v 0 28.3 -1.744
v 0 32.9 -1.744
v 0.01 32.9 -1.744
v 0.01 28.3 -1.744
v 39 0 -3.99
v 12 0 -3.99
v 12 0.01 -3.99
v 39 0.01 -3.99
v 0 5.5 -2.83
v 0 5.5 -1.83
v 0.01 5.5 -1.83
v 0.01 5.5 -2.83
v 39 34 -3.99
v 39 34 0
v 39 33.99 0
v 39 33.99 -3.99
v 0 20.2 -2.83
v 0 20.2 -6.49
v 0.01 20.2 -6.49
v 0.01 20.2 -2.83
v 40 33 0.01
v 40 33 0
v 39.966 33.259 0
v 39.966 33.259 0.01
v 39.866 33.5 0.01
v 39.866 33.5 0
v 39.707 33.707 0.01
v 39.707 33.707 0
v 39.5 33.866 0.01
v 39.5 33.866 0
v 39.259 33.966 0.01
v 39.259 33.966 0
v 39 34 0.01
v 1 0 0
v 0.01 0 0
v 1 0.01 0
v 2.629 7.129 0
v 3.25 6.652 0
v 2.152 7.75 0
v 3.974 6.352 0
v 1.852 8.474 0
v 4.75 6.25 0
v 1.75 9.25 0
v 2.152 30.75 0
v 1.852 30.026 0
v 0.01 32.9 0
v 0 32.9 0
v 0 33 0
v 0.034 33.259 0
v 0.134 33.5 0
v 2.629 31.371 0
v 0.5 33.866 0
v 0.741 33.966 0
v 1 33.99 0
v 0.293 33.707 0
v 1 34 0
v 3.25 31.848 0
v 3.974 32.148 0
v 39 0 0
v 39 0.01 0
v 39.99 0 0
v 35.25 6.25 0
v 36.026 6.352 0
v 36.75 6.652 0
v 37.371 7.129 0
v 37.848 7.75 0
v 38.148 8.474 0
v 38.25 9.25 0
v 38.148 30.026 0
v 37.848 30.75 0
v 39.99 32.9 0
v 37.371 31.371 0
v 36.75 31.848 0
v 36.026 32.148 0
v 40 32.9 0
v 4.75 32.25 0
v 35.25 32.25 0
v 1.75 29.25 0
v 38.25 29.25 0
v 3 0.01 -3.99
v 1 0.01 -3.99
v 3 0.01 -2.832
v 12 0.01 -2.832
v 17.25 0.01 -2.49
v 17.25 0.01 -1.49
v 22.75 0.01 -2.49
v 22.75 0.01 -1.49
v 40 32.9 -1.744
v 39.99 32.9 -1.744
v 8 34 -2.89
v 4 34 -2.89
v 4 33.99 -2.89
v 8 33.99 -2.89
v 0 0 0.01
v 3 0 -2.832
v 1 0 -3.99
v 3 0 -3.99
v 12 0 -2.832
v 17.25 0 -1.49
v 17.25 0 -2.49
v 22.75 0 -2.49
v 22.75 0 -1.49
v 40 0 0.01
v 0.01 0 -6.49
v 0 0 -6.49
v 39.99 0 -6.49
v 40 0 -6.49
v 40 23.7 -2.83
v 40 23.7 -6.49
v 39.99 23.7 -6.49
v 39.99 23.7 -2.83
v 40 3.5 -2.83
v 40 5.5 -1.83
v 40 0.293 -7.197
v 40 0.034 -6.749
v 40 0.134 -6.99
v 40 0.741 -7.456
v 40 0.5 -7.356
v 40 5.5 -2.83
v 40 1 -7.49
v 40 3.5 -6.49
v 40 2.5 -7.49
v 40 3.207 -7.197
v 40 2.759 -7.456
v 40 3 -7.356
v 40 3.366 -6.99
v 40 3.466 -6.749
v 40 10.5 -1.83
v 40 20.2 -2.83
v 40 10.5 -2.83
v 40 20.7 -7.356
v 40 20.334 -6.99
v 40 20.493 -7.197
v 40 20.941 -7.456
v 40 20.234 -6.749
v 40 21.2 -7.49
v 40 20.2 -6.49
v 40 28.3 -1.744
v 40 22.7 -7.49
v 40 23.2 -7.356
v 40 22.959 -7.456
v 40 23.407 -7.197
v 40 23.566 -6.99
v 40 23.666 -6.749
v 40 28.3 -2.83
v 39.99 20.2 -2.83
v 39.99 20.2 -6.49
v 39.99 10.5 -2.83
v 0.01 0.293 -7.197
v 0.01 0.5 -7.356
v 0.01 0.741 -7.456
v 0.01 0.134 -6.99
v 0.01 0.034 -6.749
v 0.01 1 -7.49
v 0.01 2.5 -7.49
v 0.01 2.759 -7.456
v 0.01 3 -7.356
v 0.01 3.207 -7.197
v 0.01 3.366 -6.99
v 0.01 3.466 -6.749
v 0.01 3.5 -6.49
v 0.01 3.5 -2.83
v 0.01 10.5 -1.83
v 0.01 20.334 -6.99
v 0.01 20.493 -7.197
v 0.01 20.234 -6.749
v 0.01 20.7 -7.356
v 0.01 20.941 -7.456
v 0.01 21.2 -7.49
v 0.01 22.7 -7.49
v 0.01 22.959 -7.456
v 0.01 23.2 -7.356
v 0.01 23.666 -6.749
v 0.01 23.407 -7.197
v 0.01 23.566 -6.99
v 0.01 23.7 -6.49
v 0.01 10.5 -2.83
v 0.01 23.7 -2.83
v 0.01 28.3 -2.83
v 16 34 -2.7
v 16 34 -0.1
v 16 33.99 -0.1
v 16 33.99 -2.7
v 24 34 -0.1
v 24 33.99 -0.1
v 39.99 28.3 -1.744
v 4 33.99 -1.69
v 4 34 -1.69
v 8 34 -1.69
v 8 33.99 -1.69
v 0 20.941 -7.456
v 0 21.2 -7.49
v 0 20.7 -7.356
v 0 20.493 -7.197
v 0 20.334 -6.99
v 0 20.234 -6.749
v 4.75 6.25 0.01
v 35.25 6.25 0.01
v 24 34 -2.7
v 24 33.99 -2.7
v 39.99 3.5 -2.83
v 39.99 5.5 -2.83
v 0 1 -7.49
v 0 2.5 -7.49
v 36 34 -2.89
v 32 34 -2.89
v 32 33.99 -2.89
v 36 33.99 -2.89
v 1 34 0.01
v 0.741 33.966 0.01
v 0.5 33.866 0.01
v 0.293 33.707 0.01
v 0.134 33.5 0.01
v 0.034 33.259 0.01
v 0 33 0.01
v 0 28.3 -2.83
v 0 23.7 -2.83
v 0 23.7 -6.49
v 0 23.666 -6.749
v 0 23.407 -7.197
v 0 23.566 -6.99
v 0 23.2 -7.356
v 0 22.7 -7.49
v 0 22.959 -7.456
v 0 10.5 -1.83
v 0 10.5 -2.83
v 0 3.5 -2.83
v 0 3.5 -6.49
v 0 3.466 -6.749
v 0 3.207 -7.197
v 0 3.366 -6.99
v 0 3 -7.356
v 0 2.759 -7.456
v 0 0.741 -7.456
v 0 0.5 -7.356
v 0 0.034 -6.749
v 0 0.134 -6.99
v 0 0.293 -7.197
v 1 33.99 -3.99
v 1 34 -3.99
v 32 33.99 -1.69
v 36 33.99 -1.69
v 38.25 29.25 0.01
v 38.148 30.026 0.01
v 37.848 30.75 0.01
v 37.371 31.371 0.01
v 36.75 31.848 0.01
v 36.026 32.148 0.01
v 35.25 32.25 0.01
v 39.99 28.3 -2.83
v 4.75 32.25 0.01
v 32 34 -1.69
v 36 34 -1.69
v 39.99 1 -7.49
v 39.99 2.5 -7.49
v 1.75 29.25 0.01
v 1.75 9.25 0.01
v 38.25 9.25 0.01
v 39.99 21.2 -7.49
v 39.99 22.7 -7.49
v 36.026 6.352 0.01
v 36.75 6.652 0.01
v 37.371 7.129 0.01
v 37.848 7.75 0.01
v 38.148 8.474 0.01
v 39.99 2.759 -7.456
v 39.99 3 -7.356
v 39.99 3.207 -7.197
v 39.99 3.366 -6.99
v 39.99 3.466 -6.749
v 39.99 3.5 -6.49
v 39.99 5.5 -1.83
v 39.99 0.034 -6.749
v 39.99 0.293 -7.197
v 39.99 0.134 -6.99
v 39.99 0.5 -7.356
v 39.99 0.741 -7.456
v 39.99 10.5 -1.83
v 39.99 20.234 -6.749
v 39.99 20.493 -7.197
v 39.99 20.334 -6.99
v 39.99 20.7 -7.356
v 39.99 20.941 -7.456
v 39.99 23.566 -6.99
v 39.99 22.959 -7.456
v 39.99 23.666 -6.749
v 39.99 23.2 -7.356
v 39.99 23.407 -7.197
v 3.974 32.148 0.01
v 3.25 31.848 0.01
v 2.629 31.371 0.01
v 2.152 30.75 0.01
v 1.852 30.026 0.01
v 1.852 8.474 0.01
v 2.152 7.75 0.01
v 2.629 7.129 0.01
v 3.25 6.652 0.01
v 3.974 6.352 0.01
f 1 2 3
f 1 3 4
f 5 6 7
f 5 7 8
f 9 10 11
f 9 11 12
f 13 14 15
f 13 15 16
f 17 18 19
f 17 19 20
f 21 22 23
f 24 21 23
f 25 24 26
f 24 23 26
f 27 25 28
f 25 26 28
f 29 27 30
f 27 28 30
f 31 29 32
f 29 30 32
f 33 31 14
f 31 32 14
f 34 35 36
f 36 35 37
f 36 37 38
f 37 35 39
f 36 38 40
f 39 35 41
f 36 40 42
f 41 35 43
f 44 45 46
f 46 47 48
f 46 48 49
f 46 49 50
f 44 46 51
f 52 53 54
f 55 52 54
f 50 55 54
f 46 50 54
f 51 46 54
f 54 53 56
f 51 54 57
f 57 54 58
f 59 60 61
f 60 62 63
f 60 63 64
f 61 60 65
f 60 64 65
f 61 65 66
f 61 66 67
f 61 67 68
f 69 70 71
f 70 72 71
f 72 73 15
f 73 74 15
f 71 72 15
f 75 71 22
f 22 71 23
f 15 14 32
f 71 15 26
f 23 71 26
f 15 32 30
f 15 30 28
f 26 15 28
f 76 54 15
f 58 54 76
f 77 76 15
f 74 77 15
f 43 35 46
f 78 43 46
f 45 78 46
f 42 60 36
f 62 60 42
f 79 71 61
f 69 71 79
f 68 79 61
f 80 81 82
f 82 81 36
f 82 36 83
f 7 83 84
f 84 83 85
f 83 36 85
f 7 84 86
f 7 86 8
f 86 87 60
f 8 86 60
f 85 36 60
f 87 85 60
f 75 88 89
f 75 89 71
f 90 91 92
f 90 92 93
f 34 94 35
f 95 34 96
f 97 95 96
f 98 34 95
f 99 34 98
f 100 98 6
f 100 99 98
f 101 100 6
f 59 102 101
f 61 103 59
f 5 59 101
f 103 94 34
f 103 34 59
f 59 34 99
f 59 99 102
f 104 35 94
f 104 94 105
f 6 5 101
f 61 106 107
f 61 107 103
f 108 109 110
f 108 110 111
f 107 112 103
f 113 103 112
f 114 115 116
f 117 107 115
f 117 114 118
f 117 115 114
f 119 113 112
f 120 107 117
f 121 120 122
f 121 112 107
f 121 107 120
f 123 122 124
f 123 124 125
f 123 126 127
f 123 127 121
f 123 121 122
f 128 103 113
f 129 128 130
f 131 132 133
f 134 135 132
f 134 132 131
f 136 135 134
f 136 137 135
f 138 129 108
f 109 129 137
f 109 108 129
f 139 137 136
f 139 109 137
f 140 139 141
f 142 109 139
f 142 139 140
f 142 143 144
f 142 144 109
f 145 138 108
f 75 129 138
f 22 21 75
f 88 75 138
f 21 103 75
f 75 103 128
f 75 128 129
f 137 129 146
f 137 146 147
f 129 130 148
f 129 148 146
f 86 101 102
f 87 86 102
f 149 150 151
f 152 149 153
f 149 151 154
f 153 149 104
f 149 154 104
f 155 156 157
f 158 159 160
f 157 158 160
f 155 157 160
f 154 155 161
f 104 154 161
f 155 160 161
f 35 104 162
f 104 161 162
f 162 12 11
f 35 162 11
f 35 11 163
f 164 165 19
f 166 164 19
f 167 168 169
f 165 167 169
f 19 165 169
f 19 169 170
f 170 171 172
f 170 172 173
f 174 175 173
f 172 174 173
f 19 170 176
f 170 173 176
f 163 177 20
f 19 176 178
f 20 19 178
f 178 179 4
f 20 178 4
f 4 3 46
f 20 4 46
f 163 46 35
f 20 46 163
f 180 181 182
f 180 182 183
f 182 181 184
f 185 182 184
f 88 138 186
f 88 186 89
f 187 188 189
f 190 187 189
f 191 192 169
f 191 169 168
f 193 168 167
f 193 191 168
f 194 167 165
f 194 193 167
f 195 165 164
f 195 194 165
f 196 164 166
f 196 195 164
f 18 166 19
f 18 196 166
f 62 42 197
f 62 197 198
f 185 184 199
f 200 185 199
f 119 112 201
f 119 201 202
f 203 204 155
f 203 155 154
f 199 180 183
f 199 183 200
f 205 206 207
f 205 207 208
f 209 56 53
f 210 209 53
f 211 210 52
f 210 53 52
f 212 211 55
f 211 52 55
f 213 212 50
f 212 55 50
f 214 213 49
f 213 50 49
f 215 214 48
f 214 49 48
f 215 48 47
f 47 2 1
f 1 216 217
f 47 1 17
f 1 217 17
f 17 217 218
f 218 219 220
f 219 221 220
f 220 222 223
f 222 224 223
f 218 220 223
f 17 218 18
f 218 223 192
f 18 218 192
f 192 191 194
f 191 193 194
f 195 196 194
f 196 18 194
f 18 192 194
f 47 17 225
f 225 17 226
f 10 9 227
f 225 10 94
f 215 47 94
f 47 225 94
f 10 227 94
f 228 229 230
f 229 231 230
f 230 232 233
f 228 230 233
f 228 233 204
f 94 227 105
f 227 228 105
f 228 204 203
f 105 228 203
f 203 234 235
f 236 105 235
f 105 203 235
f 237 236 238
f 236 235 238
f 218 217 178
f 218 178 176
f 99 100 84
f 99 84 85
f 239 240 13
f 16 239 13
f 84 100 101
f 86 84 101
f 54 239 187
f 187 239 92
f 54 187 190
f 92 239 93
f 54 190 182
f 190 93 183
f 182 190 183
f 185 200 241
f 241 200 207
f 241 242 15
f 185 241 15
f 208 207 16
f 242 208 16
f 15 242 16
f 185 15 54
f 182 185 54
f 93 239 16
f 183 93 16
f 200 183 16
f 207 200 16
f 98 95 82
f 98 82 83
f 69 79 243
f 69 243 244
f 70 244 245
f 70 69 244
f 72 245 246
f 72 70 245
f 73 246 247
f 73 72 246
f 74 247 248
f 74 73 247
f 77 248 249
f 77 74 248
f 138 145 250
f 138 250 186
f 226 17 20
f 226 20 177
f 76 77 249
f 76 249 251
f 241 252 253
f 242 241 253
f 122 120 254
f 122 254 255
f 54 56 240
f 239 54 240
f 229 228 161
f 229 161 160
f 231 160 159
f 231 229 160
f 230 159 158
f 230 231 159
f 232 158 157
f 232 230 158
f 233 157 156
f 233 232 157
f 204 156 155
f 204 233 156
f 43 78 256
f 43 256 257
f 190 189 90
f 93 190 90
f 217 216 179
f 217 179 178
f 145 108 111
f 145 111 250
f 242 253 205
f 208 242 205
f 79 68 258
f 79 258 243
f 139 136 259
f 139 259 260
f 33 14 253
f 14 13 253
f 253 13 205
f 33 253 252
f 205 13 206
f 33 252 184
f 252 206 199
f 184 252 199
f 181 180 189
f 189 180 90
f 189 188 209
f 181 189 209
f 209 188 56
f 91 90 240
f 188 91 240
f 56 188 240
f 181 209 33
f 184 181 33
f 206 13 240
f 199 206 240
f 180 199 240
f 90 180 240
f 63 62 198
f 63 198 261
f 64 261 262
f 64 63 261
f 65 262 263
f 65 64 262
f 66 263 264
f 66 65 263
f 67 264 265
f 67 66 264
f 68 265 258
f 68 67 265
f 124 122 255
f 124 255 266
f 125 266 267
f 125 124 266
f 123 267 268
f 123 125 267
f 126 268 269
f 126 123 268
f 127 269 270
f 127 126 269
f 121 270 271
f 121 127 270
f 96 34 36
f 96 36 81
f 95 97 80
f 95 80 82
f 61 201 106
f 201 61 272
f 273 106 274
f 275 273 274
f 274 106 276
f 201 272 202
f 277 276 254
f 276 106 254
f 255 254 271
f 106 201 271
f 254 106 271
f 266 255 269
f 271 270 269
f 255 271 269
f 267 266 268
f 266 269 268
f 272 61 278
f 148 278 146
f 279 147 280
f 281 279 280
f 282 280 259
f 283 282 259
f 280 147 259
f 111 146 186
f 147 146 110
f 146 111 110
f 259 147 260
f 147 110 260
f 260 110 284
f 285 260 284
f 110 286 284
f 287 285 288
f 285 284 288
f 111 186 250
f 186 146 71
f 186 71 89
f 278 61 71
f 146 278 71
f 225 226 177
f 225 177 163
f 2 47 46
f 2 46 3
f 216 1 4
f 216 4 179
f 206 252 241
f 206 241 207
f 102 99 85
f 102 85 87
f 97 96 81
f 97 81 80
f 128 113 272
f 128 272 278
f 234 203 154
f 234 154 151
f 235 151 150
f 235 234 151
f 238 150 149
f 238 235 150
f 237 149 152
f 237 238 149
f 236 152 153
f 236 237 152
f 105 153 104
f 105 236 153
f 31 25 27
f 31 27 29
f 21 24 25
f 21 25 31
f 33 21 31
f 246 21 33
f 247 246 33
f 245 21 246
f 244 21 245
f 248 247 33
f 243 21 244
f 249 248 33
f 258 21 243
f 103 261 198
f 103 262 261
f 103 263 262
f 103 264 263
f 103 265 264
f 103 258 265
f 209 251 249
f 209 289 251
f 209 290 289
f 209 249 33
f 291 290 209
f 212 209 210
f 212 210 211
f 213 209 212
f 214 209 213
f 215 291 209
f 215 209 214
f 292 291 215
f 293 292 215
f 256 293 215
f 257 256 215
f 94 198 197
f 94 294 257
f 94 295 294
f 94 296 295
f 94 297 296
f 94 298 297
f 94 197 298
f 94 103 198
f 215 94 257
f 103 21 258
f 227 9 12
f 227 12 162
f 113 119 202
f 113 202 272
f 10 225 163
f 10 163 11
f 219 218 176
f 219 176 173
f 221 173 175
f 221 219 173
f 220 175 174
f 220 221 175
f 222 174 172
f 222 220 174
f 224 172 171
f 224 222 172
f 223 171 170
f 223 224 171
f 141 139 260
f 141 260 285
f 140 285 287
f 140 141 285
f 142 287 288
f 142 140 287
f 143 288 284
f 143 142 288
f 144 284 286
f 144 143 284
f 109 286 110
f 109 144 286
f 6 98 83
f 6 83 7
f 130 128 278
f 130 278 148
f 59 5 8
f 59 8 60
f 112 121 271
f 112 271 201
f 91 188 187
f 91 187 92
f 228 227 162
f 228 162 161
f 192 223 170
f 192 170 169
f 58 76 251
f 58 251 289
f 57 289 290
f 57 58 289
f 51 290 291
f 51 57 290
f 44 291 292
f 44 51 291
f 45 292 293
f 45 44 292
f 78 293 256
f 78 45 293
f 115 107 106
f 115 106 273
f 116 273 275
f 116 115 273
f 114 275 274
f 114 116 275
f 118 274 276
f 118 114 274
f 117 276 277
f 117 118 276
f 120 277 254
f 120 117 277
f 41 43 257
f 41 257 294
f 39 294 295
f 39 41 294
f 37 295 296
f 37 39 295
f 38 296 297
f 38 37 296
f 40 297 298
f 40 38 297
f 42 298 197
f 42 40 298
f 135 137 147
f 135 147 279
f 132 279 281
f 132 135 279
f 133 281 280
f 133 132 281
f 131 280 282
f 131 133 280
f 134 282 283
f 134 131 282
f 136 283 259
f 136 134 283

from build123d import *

# Parameters (mm, degrees)
RESSALTO_EXTRUS_O1_DEPTH = 0.01
ESBO_O2_W                = 5.5
ESBO_O2_H                = 1
RESSALTO_EXTRUS_O2_DEPTH = 0.01
RESSALTO_EXTRUS_O3_DEPTH = 0.01
RESSALTO_EXTRUS_O6_DEPTH = 0.01
ESBO_O5_W                = 38
ESBO_O5_H                = 4
ESBO_O5_W_2              = 8
ESBO_O5_H_2              = 2.6
ESBO_O5_W_3              = 4
ESBO_O5_H_3              = 1.2
RESSALTO_EXTRUS_O8_DEPTH = 0.01


with BuildPart() as part:
    # Esboço1 → Ressalto-extrusão1 (new body)
    with BuildSketch(Plane.XY):
        with BuildLine():
            Line((0, 0), (40, 0))
            Line((40, 0), (40, 33))
            ThreePointArc((40, 33), (39.707106781, 33.707106781), (39, 34))
            Line((39, 34), (1, 34))
            ThreePointArc((1, 34), (0.292893219, 33.707106781), (0, 33))
            Line((0, 33), (0, 0))
        make_face()
        with BuildLine():
            Line((4.75, 6.25), (35.25, 6.25))
            ThreePointArc((35.25, 6.25), (37.371320344, 7.128679656), (38.25, 9.25))
            Line((38.25, 9.25), (38.25, 29.25))
            ThreePointArc((38.25, 29.25), (37.371320344, 31.371320344), (35.25, 32.25))
            Line((35.25, 32.25), (4.75, 32.25))
            ThreePointArc((4.75, 32.25), (2.628679656, 31.371320344), (1.75, 29.25))
            Line((1.75, 29.25), (1.75, 9.25))
            ThreePointArc((1.75, 9.25), (2.628679656, 7.128679656), (4.75, 6.25))
        make_face(mode=Mode.SUBTRACT)
    extrude(amount=RESSALTO_EXTRUS_O1_DEPTH)

    # Esboço2 → Ressalto-extrusão2 (add)
    with BuildSketch(Plane.XZ):
        Polygon((1, -3.99), (3, -3.99), (3, -2.832105263), (12, -2.832105263), (12, -3.99), (39, -3.99), (39, 0.01), (1, 0.01), align=None)
        with Locations((20, -1.99)):
            Rectangle(ESBO_O2_W, ESBO_O2_H, mode=Mode.SUBTRACT)
    extrude(amount=-RESSALTO_EXTRUS_O2_DEPTH)

    # Esboço3 → Ressalto-extrusão3 (add)
    with BuildSketch(Plane(origin=(40, 0, 0), x_dir=(0, 0, -1), z_dir=(1, 0, 0))):
        with BuildLine():
            Line((4.5527289, 3.5), (2.83, 3.5))
            Line((2.83, 3.5), (2.83, 5.5))
            Line((2.83, 5.5), (1.83, 5.5))
            Line((1.83, 5.5), (1.83, 10.5))
            Line((1.83, 10.5), (2.83, 10.5))
            Line((2.83, 10.5), (2.83, 20.2))
            Line((2.83, 20.2), (6.49, 20.2))
            ThreePointArc((6.49, 20.2), (7.197106781, 20.492893219), (7.49, 21.2))
            Line((7.49, 21.2), (7.49, 22.7))
            ThreePointArc((7.49, 22.7), (7.197106781, 23.407106781), (6.49, 23.7))
            Line((6.49, 23.7), (2.83, 23.7))
            Line((2.83, 23.7), (2.83, 28.3))
            Line((2.83, 28.3), (1.743518889, 28.3))
            Line((1.743518889, 28.3), (1.743518889, 32.9))
            Line((1.743518889, 32.9), (-0.01, 32.9))
            Line((-0.01, 32.9), (-0.01, 0))
            Line((-0.01, 0), (3.99, 0))
            Line((3.99, 0), (6.49, 0))
            ThreePointArc((6.49, 0), (7.197106781, 0.292893219), (7.49, 1))
            Line((7.49, 1), (7.49, 2.5))
            ThreePointArc((7.49, 2.5), (7.197106781, 3.207106781), (6.49, 3.5))
            Line((6.49, 3.5), (4.5527289, 3.5))
        make_face()
    extrude(amount=-RESSALTO_EXTRUS_O3_DEPTH)

    # Esboço5 → Ressalto-extrusão8 (add)
    with BuildSketch(Plane(origin=(0, 34, 0), x_dir=(1, 0, 0), z_dir=(0, 1, 0))):
        with Locations((20, 1.99)):
            Rectangle(ESBO_O5_W, ESBO_O5_H)
        with Locations((20, 1.4)):
            Rectangle(ESBO_O5_W_2, ESBO_O5_H_2, mode=Mode.SUBTRACT)
        with Locations((34, 2.29)):
            Rectangle(ESBO_O5_W_3, ESBO_O5_H_3, mode=Mode.SUBTRACT)
        with Locations((6, 2.29)):
            Rectangle(ESBO_O5_W_3, ESBO_O5_H_3, mode=Mode.SUBTRACT)
    extrude(amount=-RESSALTO_EXTRUS_O8_DEPTH)


with BuildPart() as body_2:
    # Esboço4 → Ressalto-extrusão6 (new body)
    with BuildSketch(Plane.ZY):
        with BuildLine():
            Line((-6.49, 0), (0, 0))
            Line((0, 0), (0, 32.9))
            Line((0, 32.9), (-1.743518889, 32.9))
            Line((-1.743518889, 32.9), (-1.743518889, 28.3))
            Line((-1.743518889, 28.3), (-2.83, 28.3))
            Line((-2.83, 28.3), (-2.83, 23.7))
            Line((-2.83, 23.7), (-6.49, 23.7))
            ThreePointArc((-6.49, 23.7), (-7.197106781, 23.407106781), (-7.49, 22.7))
            Line((-7.49, 22.7), (-7.49, 21.2))
            ThreePointArc((-7.49, 21.2), (-7.197106781, 20.492893219), (-6.49, 20.2))
            Line((-6.49, 20.2), (-2.83, 20.2))
            Line((-2.83, 20.2), (-2.83, 10.5))
            Line((-2.83, 10.5), (-1.83, 10.5))
            Line((-1.83, 10.5), (-1.83, 5.5))
            Line((-1.83, 5.5), (-2.83, 5.5))
            Line((-2.83, 5.5), (-2.83, 3.5))
            Line((-2.83, 3.5), (-6.49, 3.5))
            ThreePointArc((-6.49, 3.5), (-7.197106781, 3.207106781), (-7.49, 2.5))
            Line((-7.49, 2.5), (-7.49, 1))
            ThreePointArc((-7.49, 1), (-7.197106781, 0.292893219), (-6.49, 0))
        make_face()
    extrude(amount=-RESSALTO_EXTRUS_O6_DEPTH)

    # Combinar2: union part
    add(part.part)


solid = body_2.part
